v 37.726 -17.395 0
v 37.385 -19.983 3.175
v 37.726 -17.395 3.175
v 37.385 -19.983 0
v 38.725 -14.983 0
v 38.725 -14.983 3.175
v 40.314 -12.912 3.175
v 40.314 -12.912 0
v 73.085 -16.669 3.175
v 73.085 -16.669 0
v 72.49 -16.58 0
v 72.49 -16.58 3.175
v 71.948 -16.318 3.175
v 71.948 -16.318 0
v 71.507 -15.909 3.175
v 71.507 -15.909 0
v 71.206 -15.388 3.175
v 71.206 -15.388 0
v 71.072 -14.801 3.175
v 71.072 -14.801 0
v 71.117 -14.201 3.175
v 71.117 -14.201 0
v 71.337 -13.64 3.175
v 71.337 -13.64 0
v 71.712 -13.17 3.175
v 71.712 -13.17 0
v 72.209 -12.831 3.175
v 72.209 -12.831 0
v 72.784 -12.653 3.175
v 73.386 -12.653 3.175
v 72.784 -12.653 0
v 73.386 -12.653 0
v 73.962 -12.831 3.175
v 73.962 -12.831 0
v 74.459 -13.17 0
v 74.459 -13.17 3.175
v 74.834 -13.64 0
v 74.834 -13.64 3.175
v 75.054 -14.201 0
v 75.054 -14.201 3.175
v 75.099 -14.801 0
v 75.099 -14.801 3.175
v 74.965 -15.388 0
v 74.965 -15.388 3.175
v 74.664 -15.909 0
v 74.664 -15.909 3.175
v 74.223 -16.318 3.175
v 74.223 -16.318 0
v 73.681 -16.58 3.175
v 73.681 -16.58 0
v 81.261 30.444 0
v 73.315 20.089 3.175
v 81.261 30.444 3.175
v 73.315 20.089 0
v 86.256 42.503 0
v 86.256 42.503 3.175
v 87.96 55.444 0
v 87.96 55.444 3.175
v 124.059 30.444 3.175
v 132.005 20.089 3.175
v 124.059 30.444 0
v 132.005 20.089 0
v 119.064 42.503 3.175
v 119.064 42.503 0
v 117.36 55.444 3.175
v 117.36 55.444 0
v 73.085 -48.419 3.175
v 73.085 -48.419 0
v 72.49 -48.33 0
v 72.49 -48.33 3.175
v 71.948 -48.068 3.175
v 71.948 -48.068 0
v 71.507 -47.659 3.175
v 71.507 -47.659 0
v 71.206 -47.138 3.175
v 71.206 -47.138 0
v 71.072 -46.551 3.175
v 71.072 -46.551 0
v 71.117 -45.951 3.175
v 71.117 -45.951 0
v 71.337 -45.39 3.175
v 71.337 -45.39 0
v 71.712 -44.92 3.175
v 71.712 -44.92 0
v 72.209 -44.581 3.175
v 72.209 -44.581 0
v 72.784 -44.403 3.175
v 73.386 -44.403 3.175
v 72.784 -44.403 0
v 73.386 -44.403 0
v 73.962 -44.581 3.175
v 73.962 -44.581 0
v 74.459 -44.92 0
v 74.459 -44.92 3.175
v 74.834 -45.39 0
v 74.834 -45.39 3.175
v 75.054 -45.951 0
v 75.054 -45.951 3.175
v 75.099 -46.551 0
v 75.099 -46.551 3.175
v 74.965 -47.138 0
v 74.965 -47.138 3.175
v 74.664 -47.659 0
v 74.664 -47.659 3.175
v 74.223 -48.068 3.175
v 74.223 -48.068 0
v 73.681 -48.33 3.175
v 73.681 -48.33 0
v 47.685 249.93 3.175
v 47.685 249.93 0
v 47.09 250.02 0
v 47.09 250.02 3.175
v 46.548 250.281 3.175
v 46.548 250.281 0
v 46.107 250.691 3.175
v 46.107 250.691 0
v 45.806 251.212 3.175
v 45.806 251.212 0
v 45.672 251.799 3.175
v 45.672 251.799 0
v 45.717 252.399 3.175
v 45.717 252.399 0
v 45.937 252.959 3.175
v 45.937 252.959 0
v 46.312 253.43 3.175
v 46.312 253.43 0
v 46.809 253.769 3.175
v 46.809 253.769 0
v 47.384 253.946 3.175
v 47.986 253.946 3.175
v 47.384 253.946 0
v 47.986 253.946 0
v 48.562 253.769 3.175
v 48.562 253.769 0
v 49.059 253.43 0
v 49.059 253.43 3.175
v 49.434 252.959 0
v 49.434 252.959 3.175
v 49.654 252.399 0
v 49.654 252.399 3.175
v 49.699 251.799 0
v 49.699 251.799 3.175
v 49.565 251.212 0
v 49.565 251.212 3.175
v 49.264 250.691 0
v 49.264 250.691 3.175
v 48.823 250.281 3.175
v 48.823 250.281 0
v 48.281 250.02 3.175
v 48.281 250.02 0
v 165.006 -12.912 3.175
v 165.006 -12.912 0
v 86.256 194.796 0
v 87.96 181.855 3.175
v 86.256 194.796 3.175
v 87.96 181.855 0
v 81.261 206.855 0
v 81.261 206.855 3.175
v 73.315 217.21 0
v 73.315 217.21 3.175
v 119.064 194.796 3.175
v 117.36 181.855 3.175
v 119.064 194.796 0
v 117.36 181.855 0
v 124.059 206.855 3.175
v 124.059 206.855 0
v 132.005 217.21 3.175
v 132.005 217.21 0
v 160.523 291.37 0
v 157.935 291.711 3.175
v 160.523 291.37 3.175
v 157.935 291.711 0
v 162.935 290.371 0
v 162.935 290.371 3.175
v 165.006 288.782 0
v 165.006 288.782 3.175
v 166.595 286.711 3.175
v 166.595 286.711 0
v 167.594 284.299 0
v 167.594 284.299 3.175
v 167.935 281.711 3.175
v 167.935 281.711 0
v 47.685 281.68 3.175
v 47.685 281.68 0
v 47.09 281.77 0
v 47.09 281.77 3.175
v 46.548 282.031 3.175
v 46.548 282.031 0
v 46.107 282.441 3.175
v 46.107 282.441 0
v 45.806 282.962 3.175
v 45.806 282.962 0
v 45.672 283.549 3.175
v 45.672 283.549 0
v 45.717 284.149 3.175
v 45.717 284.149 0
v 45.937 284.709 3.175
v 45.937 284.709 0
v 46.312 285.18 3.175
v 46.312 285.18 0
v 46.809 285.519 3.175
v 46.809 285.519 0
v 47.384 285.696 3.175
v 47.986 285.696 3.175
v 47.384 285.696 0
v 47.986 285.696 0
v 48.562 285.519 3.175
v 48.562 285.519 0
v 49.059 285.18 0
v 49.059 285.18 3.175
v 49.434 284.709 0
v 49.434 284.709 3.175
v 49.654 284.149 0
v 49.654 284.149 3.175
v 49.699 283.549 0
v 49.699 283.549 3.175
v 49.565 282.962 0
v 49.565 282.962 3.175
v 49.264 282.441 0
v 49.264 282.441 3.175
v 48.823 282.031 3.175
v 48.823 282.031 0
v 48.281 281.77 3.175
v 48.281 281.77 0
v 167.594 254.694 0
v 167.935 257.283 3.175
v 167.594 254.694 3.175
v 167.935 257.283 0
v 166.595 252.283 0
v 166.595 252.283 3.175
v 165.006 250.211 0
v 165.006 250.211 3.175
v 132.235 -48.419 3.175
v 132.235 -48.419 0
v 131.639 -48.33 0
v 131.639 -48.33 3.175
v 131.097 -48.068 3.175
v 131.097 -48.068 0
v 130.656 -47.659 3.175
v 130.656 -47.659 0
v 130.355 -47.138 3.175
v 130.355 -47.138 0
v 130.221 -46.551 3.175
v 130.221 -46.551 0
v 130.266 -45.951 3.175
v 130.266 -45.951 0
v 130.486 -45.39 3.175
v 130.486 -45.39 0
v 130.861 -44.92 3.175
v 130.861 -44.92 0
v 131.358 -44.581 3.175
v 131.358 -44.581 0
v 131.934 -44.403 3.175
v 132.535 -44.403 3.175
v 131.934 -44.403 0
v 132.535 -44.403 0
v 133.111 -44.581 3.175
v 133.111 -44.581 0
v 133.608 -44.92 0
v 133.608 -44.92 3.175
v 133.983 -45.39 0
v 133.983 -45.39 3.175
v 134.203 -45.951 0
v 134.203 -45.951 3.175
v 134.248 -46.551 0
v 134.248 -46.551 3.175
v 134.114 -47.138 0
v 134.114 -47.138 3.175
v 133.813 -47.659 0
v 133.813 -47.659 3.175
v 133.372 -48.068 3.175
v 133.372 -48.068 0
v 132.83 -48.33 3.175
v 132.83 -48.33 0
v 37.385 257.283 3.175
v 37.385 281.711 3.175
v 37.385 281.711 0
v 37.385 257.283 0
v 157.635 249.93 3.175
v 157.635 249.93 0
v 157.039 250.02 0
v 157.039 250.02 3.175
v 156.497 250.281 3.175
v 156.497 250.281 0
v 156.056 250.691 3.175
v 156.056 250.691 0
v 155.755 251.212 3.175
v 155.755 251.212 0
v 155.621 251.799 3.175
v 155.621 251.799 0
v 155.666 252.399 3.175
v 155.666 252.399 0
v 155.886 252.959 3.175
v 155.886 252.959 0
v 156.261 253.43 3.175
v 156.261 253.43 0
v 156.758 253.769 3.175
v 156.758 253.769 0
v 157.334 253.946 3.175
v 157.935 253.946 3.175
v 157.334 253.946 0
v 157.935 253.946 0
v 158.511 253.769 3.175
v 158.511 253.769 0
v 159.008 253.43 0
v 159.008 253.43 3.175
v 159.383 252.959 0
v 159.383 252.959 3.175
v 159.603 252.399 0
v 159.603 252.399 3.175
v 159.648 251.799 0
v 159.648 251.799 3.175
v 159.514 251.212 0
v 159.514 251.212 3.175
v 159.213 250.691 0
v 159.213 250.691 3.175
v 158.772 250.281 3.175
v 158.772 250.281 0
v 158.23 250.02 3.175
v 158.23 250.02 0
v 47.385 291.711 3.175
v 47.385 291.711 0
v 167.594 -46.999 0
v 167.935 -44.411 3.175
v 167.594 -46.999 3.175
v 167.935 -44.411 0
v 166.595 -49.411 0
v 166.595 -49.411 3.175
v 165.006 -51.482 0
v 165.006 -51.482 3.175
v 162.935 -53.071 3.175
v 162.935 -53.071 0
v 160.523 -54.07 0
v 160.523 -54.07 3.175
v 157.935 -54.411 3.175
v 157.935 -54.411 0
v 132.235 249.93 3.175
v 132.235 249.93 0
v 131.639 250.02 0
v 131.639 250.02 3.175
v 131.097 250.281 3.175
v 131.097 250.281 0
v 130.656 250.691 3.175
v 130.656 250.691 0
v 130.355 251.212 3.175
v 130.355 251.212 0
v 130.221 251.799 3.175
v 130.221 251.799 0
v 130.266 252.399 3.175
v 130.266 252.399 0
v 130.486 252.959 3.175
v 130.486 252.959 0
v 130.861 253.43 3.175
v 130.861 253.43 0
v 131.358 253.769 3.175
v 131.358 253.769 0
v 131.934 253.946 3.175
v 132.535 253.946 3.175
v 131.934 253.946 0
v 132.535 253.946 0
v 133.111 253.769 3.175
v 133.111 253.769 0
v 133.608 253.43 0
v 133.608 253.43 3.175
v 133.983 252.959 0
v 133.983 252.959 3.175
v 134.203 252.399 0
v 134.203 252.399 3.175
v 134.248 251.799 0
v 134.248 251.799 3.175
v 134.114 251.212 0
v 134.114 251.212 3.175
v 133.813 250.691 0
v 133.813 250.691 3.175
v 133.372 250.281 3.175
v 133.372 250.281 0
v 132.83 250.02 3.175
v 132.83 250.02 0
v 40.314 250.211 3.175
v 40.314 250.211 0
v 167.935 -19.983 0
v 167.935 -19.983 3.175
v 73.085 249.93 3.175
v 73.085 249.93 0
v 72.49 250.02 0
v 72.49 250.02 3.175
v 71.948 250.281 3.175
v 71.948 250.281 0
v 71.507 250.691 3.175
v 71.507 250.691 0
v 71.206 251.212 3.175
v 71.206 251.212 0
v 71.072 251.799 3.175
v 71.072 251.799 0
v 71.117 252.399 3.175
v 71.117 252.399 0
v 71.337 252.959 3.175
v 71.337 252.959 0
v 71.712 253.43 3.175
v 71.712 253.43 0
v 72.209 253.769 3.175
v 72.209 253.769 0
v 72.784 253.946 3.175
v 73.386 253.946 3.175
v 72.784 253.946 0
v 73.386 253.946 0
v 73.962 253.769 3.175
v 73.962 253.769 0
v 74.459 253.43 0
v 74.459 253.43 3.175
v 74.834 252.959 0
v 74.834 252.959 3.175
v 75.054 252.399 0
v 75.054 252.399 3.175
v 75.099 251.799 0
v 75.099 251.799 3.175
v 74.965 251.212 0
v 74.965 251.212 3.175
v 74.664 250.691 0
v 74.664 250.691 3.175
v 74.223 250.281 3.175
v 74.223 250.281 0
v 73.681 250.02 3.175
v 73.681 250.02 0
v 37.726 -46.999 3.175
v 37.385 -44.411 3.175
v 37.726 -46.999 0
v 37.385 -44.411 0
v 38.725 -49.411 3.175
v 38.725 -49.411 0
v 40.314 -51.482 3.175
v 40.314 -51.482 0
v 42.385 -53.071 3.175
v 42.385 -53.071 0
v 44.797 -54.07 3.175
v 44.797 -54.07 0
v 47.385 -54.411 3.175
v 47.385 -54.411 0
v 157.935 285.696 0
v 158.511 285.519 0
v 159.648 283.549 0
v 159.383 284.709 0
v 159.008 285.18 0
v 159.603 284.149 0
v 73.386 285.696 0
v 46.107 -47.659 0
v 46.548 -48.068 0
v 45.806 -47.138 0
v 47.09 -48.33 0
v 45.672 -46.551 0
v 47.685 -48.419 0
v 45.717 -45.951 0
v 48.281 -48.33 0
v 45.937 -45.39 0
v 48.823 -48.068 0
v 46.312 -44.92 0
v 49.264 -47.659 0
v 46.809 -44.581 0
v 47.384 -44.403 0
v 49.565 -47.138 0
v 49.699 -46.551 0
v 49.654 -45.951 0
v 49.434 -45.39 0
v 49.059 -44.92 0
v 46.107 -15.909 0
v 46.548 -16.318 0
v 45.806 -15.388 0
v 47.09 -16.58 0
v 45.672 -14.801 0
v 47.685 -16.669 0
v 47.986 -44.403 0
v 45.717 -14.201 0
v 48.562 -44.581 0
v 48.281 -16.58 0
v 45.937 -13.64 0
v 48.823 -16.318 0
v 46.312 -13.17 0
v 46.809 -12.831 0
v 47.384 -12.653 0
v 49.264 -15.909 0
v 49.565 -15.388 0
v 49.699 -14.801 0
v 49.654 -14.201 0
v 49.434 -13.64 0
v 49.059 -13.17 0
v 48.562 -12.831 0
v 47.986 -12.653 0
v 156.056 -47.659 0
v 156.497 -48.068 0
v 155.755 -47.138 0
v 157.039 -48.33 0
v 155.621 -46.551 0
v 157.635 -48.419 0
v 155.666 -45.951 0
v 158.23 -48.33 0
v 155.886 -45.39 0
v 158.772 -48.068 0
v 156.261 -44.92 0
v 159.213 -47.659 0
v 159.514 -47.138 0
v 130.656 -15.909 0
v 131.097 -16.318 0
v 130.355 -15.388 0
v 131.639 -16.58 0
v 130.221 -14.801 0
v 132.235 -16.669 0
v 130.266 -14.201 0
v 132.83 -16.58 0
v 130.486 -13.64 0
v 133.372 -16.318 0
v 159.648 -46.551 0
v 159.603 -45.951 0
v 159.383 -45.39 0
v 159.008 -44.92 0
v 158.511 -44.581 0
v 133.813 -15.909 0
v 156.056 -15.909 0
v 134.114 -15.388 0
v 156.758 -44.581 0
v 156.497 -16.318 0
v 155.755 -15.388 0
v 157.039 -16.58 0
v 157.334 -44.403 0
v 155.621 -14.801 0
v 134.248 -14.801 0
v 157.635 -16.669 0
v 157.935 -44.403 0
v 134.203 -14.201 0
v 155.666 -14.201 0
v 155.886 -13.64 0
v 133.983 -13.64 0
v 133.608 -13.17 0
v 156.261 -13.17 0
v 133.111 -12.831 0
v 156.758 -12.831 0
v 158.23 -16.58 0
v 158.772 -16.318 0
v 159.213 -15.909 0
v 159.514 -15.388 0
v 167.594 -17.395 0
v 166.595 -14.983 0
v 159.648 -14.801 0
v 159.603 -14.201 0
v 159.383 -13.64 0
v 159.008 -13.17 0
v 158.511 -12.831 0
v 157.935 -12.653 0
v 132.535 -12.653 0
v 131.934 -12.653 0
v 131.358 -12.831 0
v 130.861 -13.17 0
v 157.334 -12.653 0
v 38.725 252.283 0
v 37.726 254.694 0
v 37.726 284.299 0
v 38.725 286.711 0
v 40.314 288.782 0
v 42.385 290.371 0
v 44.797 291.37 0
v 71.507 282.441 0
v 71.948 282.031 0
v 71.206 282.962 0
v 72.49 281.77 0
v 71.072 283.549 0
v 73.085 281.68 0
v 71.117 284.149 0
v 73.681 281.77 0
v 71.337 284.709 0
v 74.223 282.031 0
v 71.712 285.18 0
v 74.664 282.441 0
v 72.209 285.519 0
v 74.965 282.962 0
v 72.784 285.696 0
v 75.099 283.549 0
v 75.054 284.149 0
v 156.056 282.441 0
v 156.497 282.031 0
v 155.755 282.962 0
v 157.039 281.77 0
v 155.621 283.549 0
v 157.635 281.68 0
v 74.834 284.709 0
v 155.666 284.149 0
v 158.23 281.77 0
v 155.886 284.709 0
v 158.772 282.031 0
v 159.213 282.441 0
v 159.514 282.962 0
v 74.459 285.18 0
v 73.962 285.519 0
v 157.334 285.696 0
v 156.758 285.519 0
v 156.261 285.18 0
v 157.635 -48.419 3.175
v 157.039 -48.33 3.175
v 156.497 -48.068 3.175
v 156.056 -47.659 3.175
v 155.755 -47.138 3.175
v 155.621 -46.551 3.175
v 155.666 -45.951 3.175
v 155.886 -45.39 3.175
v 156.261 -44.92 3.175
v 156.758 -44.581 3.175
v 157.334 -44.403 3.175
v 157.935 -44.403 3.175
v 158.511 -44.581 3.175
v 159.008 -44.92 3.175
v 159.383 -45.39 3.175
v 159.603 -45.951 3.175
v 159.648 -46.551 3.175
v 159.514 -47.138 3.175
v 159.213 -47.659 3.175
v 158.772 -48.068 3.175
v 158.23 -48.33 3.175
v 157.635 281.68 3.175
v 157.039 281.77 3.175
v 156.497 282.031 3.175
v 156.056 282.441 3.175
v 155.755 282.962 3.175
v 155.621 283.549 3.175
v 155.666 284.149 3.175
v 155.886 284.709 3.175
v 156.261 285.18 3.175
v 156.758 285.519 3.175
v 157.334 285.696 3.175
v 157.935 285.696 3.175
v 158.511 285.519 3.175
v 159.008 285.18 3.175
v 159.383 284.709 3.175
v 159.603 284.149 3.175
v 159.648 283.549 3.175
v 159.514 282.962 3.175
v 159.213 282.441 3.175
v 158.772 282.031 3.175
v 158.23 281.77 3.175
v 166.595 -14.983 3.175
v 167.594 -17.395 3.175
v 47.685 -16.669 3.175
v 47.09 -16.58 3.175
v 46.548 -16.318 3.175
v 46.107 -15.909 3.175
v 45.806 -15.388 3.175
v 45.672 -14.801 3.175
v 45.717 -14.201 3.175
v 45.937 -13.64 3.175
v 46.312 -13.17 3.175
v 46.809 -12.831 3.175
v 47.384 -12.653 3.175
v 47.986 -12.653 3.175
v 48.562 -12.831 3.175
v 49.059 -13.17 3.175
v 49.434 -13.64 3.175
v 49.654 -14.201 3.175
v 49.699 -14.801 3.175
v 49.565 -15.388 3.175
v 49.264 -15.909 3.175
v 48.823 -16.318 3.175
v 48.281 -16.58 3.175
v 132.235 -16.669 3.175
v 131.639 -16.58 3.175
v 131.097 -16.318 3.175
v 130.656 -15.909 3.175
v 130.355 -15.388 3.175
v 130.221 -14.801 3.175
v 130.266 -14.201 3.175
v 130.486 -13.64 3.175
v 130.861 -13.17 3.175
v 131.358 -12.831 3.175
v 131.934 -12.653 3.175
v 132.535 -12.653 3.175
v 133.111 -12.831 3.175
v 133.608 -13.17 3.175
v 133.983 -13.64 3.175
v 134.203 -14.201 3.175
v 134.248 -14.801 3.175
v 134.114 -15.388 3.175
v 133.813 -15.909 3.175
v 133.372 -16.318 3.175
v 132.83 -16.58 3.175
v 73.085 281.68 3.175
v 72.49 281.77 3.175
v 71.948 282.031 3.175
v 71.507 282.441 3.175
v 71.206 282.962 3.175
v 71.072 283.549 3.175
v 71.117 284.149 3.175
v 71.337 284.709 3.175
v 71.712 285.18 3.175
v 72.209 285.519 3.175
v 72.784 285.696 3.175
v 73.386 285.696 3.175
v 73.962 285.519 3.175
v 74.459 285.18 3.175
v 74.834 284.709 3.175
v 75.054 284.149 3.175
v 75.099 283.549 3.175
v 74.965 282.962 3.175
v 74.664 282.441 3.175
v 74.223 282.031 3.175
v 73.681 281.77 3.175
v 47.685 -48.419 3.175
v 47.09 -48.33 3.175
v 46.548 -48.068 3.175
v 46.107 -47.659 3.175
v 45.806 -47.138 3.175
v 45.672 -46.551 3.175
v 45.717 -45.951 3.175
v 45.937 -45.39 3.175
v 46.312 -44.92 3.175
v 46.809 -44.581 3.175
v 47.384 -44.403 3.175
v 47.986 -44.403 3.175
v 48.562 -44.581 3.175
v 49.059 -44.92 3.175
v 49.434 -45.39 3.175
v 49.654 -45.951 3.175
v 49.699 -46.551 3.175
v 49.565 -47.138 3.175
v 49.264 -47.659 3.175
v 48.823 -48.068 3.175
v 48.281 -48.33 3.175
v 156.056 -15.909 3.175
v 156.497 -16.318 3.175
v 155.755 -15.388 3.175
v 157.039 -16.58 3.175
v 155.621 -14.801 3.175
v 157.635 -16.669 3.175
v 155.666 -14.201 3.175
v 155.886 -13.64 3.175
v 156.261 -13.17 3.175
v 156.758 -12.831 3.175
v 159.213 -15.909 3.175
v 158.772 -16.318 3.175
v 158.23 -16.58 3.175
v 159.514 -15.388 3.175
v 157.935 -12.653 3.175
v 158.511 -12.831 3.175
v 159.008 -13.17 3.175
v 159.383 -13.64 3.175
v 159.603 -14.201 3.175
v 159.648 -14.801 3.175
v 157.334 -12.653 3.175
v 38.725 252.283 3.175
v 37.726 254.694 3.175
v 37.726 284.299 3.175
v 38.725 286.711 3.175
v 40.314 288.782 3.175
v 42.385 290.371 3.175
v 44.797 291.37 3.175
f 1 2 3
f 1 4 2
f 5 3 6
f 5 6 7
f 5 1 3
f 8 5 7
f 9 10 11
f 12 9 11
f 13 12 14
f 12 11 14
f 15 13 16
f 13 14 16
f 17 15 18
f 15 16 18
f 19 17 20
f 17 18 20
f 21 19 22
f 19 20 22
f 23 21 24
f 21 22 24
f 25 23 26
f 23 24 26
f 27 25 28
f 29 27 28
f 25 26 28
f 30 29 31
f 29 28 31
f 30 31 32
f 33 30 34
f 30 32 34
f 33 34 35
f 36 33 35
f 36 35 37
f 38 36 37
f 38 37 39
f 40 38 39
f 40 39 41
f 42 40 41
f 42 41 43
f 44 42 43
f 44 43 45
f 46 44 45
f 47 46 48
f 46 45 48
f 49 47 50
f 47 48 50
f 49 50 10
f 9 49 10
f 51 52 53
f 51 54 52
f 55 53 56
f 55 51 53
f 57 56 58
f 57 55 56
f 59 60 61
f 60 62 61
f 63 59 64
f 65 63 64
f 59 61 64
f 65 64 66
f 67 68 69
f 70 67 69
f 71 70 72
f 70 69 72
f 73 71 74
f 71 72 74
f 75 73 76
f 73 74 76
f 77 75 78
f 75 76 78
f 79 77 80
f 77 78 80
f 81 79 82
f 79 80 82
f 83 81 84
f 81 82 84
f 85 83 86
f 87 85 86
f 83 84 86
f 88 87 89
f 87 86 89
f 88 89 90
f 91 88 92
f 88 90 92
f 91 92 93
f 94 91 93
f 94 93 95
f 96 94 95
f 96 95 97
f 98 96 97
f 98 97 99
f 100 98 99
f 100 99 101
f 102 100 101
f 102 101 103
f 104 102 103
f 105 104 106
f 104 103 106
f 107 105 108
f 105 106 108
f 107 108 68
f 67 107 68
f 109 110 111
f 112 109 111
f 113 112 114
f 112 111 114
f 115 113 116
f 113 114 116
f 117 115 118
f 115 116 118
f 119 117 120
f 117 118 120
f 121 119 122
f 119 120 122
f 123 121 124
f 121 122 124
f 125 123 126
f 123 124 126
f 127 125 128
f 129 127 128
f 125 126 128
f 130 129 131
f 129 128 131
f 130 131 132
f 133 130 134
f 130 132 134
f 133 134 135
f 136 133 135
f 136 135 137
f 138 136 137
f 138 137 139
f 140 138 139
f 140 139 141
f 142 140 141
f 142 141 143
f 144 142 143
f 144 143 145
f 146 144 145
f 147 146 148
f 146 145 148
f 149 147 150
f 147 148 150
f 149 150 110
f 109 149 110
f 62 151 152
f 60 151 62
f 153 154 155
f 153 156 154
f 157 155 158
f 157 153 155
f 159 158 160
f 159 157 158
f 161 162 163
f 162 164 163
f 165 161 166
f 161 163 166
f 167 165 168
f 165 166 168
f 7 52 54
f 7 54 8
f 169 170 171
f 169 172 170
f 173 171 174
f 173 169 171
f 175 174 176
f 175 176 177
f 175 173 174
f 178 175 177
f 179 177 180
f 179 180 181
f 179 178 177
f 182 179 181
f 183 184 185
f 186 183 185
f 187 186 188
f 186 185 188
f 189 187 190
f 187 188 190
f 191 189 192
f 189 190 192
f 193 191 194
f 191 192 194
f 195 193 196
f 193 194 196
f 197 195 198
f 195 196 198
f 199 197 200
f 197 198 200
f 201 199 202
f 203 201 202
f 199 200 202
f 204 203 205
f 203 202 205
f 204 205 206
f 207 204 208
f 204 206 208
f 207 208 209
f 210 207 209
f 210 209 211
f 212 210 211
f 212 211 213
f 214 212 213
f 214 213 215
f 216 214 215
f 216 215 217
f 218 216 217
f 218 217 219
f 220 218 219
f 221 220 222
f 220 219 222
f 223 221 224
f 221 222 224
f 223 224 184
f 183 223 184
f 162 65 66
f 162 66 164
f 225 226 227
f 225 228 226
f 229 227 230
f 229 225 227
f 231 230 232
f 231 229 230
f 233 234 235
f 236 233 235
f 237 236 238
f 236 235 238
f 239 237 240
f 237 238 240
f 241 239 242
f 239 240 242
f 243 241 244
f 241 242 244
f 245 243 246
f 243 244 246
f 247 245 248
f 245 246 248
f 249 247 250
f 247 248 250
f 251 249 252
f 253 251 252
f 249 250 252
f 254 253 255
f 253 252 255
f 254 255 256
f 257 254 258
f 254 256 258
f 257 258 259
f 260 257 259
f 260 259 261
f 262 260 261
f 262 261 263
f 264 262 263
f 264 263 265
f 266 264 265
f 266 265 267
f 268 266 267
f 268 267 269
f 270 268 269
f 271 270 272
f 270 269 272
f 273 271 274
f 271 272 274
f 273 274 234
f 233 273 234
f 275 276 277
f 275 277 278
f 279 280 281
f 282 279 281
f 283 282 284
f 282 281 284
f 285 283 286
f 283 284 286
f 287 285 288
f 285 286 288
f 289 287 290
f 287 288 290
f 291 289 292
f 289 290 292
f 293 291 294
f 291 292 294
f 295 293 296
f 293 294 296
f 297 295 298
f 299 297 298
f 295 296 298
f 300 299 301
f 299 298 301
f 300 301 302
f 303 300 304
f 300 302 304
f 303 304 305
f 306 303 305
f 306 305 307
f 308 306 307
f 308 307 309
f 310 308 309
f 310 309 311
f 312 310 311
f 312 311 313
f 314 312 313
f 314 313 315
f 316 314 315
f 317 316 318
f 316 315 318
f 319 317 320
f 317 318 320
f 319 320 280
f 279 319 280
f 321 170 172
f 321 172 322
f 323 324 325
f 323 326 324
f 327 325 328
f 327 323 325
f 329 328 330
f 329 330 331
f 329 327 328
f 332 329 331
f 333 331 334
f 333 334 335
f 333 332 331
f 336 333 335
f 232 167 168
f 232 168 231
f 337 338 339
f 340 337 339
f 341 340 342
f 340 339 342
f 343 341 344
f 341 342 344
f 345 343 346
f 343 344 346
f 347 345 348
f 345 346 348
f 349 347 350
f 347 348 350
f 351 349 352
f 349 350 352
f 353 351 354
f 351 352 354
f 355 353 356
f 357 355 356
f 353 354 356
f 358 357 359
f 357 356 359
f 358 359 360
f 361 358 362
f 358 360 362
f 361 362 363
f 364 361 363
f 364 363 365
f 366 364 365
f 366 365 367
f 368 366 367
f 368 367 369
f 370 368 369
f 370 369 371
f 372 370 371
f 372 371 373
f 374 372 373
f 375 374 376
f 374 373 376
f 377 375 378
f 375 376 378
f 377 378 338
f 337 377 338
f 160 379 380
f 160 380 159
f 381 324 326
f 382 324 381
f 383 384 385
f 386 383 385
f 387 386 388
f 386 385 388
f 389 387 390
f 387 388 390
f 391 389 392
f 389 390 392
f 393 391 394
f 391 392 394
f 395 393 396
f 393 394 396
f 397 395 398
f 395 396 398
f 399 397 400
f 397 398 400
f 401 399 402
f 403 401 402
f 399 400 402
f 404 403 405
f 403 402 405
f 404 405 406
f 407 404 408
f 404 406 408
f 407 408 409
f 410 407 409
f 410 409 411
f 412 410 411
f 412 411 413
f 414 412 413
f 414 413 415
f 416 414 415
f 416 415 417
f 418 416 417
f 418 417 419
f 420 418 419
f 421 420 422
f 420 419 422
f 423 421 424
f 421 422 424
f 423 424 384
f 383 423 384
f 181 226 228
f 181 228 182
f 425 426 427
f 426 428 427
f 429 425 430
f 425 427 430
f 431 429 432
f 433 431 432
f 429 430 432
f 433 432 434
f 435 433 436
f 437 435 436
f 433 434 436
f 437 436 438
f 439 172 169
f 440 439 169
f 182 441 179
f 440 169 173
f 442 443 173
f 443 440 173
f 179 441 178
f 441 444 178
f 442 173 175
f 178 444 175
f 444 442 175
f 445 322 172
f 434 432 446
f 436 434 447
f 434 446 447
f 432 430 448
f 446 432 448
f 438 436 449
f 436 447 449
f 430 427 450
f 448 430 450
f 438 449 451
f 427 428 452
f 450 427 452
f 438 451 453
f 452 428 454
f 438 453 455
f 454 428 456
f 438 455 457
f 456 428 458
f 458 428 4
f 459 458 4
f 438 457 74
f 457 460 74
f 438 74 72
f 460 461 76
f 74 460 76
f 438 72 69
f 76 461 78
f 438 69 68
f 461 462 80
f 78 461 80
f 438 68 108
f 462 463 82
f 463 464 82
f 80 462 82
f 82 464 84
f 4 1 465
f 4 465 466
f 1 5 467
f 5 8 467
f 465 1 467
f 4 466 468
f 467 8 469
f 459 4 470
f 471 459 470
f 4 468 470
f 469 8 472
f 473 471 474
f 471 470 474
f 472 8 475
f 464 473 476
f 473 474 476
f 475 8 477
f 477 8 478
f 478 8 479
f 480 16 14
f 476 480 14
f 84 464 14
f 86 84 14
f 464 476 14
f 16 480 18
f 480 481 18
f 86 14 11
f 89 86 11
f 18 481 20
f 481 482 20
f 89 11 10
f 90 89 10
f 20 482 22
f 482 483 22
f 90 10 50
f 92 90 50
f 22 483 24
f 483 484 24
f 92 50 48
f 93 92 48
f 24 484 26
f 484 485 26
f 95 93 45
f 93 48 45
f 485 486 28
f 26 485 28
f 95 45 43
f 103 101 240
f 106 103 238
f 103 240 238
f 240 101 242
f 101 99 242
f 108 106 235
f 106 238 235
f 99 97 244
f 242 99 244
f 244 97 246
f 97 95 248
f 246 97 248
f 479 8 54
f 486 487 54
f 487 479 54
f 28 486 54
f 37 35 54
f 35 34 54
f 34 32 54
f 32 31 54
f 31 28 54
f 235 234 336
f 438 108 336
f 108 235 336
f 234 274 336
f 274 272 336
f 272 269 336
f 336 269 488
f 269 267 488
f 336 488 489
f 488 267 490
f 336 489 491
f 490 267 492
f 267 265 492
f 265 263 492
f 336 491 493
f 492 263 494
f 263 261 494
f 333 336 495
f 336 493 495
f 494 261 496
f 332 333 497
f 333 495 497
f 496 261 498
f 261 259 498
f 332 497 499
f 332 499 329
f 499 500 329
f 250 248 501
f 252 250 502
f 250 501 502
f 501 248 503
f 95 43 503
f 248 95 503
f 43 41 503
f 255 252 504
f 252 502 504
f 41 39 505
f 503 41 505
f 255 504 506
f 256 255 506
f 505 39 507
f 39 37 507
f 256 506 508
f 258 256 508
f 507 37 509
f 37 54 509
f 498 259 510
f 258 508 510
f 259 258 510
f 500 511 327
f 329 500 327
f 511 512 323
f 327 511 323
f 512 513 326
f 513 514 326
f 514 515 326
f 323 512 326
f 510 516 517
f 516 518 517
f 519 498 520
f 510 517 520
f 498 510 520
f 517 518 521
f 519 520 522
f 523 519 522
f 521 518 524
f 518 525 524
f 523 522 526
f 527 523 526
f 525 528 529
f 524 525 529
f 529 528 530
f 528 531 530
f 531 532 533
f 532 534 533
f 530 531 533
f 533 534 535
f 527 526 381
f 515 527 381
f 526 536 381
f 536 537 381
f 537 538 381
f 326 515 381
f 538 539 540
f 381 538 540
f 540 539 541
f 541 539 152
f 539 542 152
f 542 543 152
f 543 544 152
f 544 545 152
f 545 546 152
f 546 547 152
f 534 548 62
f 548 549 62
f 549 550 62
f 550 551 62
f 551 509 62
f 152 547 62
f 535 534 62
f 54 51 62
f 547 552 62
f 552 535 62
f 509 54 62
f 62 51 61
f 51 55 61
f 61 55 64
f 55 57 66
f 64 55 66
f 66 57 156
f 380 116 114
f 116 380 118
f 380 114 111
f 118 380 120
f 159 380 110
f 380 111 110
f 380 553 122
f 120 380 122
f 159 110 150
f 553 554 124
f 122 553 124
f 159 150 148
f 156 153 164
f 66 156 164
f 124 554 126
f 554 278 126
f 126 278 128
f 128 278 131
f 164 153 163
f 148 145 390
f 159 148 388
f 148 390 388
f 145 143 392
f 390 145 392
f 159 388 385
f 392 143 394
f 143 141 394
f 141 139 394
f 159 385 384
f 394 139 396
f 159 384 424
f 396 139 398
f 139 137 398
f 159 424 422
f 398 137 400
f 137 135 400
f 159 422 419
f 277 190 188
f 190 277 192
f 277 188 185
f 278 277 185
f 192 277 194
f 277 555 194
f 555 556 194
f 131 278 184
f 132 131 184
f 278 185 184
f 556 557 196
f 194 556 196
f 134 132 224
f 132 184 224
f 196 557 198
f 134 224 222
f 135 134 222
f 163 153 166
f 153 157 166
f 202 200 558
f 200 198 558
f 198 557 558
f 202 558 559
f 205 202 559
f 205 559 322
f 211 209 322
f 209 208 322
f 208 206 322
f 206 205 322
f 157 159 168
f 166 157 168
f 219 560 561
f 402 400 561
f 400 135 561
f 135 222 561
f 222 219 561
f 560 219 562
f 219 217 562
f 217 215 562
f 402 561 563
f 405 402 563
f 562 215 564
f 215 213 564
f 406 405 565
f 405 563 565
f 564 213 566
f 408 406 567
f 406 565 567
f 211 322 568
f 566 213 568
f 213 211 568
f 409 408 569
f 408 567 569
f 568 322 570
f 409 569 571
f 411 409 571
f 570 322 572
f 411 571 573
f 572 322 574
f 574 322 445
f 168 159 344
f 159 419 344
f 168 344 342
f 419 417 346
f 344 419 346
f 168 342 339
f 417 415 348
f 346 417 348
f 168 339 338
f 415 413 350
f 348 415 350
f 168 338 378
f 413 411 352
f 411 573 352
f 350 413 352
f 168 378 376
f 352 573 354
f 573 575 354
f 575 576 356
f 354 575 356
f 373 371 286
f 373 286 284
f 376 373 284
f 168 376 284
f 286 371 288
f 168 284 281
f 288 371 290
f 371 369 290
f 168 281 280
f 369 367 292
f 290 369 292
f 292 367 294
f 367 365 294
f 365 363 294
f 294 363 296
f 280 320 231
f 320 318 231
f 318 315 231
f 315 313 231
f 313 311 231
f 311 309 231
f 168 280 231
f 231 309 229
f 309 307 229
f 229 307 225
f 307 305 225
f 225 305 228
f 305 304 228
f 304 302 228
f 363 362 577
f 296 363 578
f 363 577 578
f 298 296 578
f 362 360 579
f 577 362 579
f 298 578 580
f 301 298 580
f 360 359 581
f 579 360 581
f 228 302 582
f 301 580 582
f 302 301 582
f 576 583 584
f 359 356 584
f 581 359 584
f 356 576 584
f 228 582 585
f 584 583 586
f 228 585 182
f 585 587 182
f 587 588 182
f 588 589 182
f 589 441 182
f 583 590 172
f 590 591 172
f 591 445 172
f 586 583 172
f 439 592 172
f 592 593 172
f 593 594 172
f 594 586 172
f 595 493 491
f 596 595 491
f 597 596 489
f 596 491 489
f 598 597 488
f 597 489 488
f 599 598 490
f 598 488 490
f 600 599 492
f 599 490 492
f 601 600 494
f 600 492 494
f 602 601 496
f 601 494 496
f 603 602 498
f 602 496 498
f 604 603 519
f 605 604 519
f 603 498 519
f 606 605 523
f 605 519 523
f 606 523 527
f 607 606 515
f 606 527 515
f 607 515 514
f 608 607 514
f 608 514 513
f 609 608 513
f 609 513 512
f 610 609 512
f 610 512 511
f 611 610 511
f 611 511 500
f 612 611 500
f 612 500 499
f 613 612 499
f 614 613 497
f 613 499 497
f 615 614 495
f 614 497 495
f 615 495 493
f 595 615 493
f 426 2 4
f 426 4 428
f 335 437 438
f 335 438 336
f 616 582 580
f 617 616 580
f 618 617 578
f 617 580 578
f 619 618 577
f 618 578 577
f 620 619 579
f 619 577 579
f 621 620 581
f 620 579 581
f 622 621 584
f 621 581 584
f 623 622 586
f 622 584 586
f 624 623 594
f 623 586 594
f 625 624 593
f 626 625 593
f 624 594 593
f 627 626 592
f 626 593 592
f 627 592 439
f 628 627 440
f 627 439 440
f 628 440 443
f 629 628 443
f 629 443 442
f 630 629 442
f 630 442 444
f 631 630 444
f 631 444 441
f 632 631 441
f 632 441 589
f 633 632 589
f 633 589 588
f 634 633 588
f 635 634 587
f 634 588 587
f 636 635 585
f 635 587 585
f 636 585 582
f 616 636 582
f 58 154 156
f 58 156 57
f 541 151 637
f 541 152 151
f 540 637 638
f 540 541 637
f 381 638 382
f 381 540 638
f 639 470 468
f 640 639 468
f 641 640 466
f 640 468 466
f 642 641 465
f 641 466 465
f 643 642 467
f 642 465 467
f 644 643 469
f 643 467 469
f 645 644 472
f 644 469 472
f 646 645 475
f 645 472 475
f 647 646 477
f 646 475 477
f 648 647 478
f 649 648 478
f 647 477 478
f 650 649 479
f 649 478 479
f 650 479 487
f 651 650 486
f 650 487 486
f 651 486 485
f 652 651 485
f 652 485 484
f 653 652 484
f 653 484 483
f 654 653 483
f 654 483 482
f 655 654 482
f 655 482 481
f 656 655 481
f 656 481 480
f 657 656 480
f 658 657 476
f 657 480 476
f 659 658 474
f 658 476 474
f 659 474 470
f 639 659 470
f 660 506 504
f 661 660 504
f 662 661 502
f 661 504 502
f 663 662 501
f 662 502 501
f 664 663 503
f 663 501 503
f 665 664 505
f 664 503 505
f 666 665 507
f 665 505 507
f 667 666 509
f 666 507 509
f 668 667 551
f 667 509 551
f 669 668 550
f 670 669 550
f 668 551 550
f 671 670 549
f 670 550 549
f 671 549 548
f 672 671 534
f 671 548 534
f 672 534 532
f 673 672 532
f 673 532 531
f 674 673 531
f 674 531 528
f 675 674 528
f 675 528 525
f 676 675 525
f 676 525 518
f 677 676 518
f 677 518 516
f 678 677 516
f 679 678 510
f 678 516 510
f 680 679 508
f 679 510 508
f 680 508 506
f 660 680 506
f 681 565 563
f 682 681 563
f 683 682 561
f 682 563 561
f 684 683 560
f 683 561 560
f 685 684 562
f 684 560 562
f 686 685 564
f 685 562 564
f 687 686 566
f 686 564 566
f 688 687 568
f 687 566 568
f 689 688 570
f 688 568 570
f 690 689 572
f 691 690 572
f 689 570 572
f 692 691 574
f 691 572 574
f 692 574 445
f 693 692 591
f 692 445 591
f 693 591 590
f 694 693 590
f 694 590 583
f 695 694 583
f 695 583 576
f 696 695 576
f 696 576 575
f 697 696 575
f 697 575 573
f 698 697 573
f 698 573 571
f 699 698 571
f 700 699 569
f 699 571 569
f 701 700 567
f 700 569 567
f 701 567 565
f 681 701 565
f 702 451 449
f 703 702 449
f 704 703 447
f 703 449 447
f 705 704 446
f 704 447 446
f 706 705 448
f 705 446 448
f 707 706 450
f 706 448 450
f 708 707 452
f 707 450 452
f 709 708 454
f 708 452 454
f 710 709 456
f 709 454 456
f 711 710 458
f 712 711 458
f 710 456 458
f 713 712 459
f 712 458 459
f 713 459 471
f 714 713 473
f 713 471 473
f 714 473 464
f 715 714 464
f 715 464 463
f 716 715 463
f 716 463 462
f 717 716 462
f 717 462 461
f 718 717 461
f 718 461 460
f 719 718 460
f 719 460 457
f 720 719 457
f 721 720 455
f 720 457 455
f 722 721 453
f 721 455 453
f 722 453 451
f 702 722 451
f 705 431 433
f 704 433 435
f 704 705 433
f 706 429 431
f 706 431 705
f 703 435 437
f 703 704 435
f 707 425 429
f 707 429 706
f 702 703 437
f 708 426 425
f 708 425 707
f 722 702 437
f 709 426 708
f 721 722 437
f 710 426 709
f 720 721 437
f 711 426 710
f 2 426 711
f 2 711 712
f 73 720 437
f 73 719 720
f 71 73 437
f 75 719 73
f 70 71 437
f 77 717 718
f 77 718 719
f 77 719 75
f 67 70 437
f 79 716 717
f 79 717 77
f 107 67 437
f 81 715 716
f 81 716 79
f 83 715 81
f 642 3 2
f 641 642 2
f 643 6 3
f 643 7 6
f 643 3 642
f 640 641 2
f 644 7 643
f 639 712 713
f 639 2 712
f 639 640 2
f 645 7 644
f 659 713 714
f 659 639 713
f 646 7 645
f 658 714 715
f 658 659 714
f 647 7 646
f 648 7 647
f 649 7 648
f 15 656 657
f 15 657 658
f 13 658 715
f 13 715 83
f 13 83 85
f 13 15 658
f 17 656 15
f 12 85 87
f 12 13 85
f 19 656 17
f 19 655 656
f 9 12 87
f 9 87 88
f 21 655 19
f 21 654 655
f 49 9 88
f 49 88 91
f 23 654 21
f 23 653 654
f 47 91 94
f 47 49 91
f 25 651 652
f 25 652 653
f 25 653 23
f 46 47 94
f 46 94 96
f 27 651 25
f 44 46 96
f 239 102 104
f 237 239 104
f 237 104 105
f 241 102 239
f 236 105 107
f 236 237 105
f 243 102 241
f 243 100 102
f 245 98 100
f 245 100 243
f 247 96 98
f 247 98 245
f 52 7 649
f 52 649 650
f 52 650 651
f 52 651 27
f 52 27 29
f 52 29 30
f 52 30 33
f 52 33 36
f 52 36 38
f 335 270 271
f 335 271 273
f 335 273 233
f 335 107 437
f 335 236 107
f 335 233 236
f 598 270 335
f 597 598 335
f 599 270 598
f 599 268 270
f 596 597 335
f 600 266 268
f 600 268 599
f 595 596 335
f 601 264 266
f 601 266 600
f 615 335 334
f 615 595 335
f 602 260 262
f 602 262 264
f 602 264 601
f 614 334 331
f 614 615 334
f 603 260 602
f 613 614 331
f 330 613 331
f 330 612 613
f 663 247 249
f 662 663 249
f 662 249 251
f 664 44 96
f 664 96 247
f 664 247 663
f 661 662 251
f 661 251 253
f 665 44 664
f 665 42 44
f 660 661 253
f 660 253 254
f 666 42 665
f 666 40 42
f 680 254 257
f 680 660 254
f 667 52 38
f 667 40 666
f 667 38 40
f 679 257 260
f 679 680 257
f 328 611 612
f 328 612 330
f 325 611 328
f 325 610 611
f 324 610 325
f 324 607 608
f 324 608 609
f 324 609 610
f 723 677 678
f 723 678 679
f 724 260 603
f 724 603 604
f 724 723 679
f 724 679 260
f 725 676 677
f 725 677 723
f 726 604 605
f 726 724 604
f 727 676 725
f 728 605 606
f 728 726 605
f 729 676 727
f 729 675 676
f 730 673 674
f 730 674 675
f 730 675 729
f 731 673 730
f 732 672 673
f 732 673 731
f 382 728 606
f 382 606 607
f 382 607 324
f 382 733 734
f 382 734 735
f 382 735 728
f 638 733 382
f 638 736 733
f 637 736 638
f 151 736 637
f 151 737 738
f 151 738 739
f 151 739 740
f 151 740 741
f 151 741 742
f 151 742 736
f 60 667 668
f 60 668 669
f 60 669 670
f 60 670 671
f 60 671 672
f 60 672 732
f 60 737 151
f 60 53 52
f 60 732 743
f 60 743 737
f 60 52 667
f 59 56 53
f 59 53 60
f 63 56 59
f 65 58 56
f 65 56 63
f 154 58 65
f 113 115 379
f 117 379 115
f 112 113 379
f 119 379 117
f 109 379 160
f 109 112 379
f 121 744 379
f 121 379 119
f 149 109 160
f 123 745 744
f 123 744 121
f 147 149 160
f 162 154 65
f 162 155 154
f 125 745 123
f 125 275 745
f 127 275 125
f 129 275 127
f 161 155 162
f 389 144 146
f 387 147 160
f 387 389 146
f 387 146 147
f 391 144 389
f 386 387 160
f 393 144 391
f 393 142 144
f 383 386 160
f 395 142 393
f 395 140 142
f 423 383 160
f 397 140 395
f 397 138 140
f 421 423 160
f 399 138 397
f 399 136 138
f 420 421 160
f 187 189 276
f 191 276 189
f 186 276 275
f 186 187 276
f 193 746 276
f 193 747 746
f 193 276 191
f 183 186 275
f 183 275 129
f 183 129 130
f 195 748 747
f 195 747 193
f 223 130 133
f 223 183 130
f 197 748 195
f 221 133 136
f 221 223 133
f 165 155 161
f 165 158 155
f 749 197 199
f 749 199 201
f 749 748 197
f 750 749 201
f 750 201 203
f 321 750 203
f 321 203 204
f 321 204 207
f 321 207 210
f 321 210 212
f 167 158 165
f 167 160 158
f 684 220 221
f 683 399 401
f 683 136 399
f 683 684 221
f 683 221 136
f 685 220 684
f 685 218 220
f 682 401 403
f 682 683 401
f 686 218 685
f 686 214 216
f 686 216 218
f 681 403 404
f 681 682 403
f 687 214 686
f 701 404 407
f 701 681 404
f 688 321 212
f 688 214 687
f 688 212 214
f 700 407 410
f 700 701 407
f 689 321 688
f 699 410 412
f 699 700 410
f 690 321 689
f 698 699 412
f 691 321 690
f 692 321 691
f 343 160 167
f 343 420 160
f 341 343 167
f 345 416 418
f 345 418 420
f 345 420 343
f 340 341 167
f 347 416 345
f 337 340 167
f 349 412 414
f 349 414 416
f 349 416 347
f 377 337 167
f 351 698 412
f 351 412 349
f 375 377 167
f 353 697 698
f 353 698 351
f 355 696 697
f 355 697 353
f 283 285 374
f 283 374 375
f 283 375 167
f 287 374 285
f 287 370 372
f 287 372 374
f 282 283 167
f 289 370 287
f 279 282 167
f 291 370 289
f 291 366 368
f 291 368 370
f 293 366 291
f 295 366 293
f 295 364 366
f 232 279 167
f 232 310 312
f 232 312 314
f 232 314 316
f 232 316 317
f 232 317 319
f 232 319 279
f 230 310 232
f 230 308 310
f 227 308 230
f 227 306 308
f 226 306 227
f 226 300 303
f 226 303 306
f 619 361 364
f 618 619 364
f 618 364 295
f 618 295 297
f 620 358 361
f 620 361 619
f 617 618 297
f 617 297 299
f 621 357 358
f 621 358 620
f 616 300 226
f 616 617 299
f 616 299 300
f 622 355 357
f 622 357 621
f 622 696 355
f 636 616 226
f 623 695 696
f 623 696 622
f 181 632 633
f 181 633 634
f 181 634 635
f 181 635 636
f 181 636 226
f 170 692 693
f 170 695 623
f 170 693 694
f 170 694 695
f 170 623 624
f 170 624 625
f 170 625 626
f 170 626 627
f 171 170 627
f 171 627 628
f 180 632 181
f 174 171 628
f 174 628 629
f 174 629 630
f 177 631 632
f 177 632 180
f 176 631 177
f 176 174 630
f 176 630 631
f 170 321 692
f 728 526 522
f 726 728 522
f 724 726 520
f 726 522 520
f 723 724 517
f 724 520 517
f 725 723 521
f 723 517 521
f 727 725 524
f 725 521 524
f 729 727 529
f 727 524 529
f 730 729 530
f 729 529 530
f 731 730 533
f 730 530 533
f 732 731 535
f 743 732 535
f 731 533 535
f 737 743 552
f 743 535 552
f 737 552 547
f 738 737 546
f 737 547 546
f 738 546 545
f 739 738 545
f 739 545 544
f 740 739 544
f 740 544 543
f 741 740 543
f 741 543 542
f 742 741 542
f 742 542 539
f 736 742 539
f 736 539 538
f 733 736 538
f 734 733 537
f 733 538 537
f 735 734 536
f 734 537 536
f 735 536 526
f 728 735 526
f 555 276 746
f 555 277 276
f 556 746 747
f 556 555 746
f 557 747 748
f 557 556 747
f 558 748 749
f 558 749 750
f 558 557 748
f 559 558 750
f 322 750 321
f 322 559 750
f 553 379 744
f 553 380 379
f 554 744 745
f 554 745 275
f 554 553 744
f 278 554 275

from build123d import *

# Parameters (mm, degrees)
BOSS_EXTRUDE1_DEPTH = 3.175
CUT_EXTRUDE1_DEPTH  = 10
SKETCH3_R           = 2.0193
BOSS_EXTRUDE2_DEPTH = 3.175
FILLET1_R           = 10
FILLET2_R           = 50


with BuildPart() as part:
    # Sketch1 → Boss-Extrude1 (new body)
    with BuildSketch(Plane.XY):
        Polygon((165.934536959, -16.66935), (157.315236959, -8.05005), (115.359952094, -8.05005), (89.959952094, -8.05005), (48.004667228, -8.05005), (39.385367228, -16.66935), (39.385367228, -40.05005), (39.385367228, -52.41105), (165.934536959, -56.67505), (165.934536959, -42.05005), align=None)
        with BuildLine():
            ThreePointArc((47.685367228, -44.38075), (49.704667228, -46.40005), (47.685367228, -48.41935))
            ThreePointArc((47.685367228, -48.41935), (45.666067228, -46.40005), (47.685367228, -44.38075))
        make_face(mode=Mode.SUBTRACT)
        with BuildLine():
            ThreePointArc((47.685367228, -12.63075), (49.704667228, -14.65005), (47.685367228, -16.66935))
            ThreePointArc((47.685367228, -16.66935), (45.666067228, -14.65005), (47.685367228, -12.63075))
        make_face(mode=Mode.SUBTRACT)
        with BuildLine():
            ThreePointArc((73.085367228, -44.38075), (75.104667228, -46.40005), (73.085367228, -48.41935))
            ThreePointArc((73.085367228, -48.41935), (71.066067228, -46.40005), (73.085367228, -44.38075))
        make_face(mode=Mode.SUBTRACT)
        with BuildLine():
            ThreePointArc((73.085367228, -12.63075), (75.104667228, -14.65005), (73.085367228, -16.66935))
            ThreePointArc((73.085367228, -16.66935), (71.066067228, -14.65005), (73.085367228, -12.63075))
        make_face(mode=Mode.SUBTRACT)
        with BuildLine():
            ThreePointArc((132.234536959, -44.38075), (134.253836959, -46.40005), (132.234536959, -48.41935))
            ThreePointArc((132.234536959, -48.41935), (130.215236959, -46.40005), (132.234536959, -44.38075))
        make_face(mode=Mode.SUBTRACT)
        with BuildLine():
            ThreePointArc((132.234536959, -12.63075), (134.253836959, -14.65005), (132.234536959, -16.66935))
            ThreePointArc((132.234536959, -16.66935), (130.215236959, -14.65005), (132.234536959, -12.63075))
        make_face(mode=Mode.SUBTRACT)
        with BuildLine():
            ThreePointArc((157.634536959, -44.38075), (159.653836959, -46.40005), (157.634536959, -48.41935))
            ThreePointArc((157.634536959, -48.41935), (155.615236959, -46.40005), (157.634536959, -44.38075))
        make_face(mode=Mode.SUBTRACT)
        with BuildLine():
            ThreePointArc((157.634536959, -12.63075), (159.653836959, -14.65005), (157.634536959, -16.66935))
            ThreePointArc((157.634536959, -16.66935), (155.615236959, -14.65005), (157.634536959, -12.63075))
        make_face(mode=Mode.SUBTRACT)
        Polygon((115.359952094, -8.05005), (157.315236959, -8.05005), (115.359952094, 33.905234866), align=None)
        Polygon((89.959952094, -8.05005), (115.359952094, -8.05005), (115.359952094, 33.905234866), (115.359952094, 203.394265134), (115.359952094, 245.34955), (89.959952094, 245.34955), (89.959952094, 203.394265134), (89.959952094, 33.905234866), align=None)
        Polygon((48.004667228, -8.05005), (89.959952094, -8.05005), (89.959952094, 33.905234866), align=None)
        Polygon((89.959952094, 245.34955), (115.359952094, 245.34955), (157.315236959, 245.34955), (165.934536959, 253.96885), (165.934536959, 279.34955), (165.934536959, 293.97455), (39.385367228, 289.71055), (39.385367228, 277.34955), (39.385367228, 253.96885), (48.004667228, 245.34955), align=None)
        with BuildLine():
            ThreePointArc((47.685367228, 253.96885), (49.704667228, 251.94955), (47.685367228, 249.93025))
            ThreePointArc((47.685367228, 249.93025), (45.666067228, 251.94955), (47.685367228, 253.96885))
        make_face(mode=Mode.SUBTRACT)
        with BuildLine():
            ThreePointArc((47.685367228, 285.71885), (49.704667228, 283.69955), (47.685367228, 281.68025))
            ThreePointArc((47.685367228, 281.68025), (45.666067228, 283.69955), (47.685367228, 285.71885))
        make_face(mode=Mode.SUBTRACT)
        with BuildLine():
            ThreePointArc((73.085367228, 253.96885), (75.104667228, 251.94955), (73.085367228, 249.93025))
            ThreePointArc((73.085367228, 249.93025), (71.066067228, 251.94955), (73.085367228, 253.96885))
        make_face(mode=Mode.SUBTRACT)
        with BuildLine():
            ThreePointArc((73.085367228, 285.71885), (75.104667228, 283.69955), (73.085367228, 281.68025))
            ThreePointArc((73.085367228, 281.68025), (71.066067228, 283.69955), (73.085367228, 285.71885))
        make_face(mode=Mode.SUBTRACT)
        with BuildLine():
            ThreePointArc((132.234536959, 253.96885), (134.253836959, 251.94955), (132.234536959, 249.93025))
            ThreePointArc((132.234536959, 249.93025), (130.215236959, 251.94955), (132.234536959, 253.96885))
        make_face(mode=Mode.SUBTRACT)
        with BuildLine():
            ThreePointArc((157.634536959, 253.96885), (159.653836959, 251.94955), (157.634536959, 249.93025))
            ThreePointArc((157.634536959, 249.93025), (155.615236959, 251.94955), (157.634536959, 253.96885))
        make_face(mode=Mode.SUBTRACT)
        with BuildLine():
            ThreePointArc((157.634536959, 285.71885), (159.653836959, 283.69955), (157.634536959, 281.68025))
            ThreePointArc((157.634536959, 281.68025), (155.615236959, 283.69955), (157.634536959, 285.71885))
        make_face(mode=Mode.SUBTRACT)
        Polygon((115.359952094, 245.34955), (115.359952094, 203.394265134), (157.315236959, 245.34955), align=None)
        Polygon((48.004667228, 245.34955), (89.959952094, 203.394265134), (89.959952094, 245.34955), align=None)
    extrude(amount=BOSS_EXTRUDE1_DEPTH)

    # Sketch2 → Cut-Extrude1 (cut)
    with BuildSketch(Plane.XY.offset(3.175)):
        Polygon((84.385367228, -52.41105), (39.385367228, -52.41105), (165.934536959, -56.67505), (165.934536959, -52.41105), (120.934536959, -52.41105), align=None)
        Polygon((120.934536959, 289.71055), (165.934536959, 289.71055), (165.934536959, 293.97455), (39.385367228, 289.71055), (84.385367228, 289.71055), align=None)
    extrude(amount=-CUT_EXTRUDE1_DEPTH, mode=Mode.SUBTRACT)

    # Sketch3 → Boss-Extrude2 (add)
    with BuildSketch(Plane.XY.offset(3.175)):
        Polygon((37.385367228, -15.840922875), (37.385367228, -54.41105), (167.934536959, -54.41105), (167.934536959, -15.840922875), (117.359952094, 34.73366199), (117.359952094, 202.56583801), (167.934536959, 253.140422875), (167.934536959, 291.71055), (37.385367228, 291.71055), (37.385367228, 253.140422875), (87.959952094, 202.56583801), (87.959952094, 34.73366199), align=None)
        with Locations((132.234536959, -46.40005)):
            Circle(SKETCH3_R, mode=Mode.SUBTRACT)
        with Locations((132.234536959, -14.65005)):
            Circle(SKETCH3_R, mode=Mode.SUBTRACT)
        with Locations((47.685367228, -14.65005)):
            Circle(SKETCH3_R, mode=Mode.SUBTRACT)
        with Locations((47.685367228, -46.40005)):
            Circle(SKETCH3_R, mode=Mode.SUBTRACT)
        with Locations((73.085367228, -46.40005)):
            Circle(SKETCH3_R, mode=Mode.SUBTRACT)
        with Locations((73.085367228, -14.65005)):
            Circle(SKETCH3_R, mode=Mode.SUBTRACT)
        with Locations((157.634536959, -14.65005)):
            Circle(SKETCH3_R, mode=Mode.SUBTRACT)
        with Locations((157.634536959, -46.40005)):
            Circle(SKETCH3_R, mode=Mode.SUBTRACT)
        with Locations((132.234536959, 251.94955)):
            Circle(SKETCH3_R, mode=Mode.SUBTRACT)
        with Locations((73.085367228, 251.94955)):
            Circle(SKETCH3_R, mode=Mode.SUBTRACT)
        with Locations((157.634536959, 251.94955)):
            Circle(SKETCH3_R, mode=Mode.SUBTRACT)
        with Locations((47.685367228, 251.94955)):
            Circle(SKETCH3_R, mode=Mode.SUBTRACT)
        with Locations((47.685367228, 283.69955)):
            Circle(SKETCH3_R, mode=Mode.SUBTRACT)
        with Locations((73.085367228, 283.69955)):
            Circle(SKETCH3_R, mode=Mode.SUBTRACT)
        with Locations((157.634536959, 283.69955)):
            Circle(SKETCH3_R, mode=Mode.SUBTRACT)
    extrude(amount=-BOSS_EXTRUDE2_DEPTH)

    # Fillet1
    fillet1_edges = [part.edges().sort_by_distance(p)[0] for p in [
        (37.385367228, -54.41105, 1.5875),
        (167.934536959, -54.41105, 1.5875),
        (167.934536959, -15.840922875, 1.5875),
        (167.934536959, 253.140422875, 1.5875),
        (167.934536959, 291.71055, 1.5875),
        (37.385367228, 291.71055, 1.5875),
        (37.385367228, 253.140422875, 1.5875),
        (37.385367228, -15.840922875, 1.5875),
    ]]
    fillet(fillet1_edges, radius=FILLET1_R)

    # Fillet2
    fillet2_edges = [part.edges().sort_by_distance(p)[0] for p in [
        (117.359952094, 34.73366199, 1.5875),
        (117.359952094, 202.56583801, 1.5875),
        (87.959952094, 202.56583801, 1.5875),
        (87.959952094, 34.73366199, 1.5875),
    ]]
    fillet(fillet2_edges, radius=FILLET2_R)


solid = part.part
